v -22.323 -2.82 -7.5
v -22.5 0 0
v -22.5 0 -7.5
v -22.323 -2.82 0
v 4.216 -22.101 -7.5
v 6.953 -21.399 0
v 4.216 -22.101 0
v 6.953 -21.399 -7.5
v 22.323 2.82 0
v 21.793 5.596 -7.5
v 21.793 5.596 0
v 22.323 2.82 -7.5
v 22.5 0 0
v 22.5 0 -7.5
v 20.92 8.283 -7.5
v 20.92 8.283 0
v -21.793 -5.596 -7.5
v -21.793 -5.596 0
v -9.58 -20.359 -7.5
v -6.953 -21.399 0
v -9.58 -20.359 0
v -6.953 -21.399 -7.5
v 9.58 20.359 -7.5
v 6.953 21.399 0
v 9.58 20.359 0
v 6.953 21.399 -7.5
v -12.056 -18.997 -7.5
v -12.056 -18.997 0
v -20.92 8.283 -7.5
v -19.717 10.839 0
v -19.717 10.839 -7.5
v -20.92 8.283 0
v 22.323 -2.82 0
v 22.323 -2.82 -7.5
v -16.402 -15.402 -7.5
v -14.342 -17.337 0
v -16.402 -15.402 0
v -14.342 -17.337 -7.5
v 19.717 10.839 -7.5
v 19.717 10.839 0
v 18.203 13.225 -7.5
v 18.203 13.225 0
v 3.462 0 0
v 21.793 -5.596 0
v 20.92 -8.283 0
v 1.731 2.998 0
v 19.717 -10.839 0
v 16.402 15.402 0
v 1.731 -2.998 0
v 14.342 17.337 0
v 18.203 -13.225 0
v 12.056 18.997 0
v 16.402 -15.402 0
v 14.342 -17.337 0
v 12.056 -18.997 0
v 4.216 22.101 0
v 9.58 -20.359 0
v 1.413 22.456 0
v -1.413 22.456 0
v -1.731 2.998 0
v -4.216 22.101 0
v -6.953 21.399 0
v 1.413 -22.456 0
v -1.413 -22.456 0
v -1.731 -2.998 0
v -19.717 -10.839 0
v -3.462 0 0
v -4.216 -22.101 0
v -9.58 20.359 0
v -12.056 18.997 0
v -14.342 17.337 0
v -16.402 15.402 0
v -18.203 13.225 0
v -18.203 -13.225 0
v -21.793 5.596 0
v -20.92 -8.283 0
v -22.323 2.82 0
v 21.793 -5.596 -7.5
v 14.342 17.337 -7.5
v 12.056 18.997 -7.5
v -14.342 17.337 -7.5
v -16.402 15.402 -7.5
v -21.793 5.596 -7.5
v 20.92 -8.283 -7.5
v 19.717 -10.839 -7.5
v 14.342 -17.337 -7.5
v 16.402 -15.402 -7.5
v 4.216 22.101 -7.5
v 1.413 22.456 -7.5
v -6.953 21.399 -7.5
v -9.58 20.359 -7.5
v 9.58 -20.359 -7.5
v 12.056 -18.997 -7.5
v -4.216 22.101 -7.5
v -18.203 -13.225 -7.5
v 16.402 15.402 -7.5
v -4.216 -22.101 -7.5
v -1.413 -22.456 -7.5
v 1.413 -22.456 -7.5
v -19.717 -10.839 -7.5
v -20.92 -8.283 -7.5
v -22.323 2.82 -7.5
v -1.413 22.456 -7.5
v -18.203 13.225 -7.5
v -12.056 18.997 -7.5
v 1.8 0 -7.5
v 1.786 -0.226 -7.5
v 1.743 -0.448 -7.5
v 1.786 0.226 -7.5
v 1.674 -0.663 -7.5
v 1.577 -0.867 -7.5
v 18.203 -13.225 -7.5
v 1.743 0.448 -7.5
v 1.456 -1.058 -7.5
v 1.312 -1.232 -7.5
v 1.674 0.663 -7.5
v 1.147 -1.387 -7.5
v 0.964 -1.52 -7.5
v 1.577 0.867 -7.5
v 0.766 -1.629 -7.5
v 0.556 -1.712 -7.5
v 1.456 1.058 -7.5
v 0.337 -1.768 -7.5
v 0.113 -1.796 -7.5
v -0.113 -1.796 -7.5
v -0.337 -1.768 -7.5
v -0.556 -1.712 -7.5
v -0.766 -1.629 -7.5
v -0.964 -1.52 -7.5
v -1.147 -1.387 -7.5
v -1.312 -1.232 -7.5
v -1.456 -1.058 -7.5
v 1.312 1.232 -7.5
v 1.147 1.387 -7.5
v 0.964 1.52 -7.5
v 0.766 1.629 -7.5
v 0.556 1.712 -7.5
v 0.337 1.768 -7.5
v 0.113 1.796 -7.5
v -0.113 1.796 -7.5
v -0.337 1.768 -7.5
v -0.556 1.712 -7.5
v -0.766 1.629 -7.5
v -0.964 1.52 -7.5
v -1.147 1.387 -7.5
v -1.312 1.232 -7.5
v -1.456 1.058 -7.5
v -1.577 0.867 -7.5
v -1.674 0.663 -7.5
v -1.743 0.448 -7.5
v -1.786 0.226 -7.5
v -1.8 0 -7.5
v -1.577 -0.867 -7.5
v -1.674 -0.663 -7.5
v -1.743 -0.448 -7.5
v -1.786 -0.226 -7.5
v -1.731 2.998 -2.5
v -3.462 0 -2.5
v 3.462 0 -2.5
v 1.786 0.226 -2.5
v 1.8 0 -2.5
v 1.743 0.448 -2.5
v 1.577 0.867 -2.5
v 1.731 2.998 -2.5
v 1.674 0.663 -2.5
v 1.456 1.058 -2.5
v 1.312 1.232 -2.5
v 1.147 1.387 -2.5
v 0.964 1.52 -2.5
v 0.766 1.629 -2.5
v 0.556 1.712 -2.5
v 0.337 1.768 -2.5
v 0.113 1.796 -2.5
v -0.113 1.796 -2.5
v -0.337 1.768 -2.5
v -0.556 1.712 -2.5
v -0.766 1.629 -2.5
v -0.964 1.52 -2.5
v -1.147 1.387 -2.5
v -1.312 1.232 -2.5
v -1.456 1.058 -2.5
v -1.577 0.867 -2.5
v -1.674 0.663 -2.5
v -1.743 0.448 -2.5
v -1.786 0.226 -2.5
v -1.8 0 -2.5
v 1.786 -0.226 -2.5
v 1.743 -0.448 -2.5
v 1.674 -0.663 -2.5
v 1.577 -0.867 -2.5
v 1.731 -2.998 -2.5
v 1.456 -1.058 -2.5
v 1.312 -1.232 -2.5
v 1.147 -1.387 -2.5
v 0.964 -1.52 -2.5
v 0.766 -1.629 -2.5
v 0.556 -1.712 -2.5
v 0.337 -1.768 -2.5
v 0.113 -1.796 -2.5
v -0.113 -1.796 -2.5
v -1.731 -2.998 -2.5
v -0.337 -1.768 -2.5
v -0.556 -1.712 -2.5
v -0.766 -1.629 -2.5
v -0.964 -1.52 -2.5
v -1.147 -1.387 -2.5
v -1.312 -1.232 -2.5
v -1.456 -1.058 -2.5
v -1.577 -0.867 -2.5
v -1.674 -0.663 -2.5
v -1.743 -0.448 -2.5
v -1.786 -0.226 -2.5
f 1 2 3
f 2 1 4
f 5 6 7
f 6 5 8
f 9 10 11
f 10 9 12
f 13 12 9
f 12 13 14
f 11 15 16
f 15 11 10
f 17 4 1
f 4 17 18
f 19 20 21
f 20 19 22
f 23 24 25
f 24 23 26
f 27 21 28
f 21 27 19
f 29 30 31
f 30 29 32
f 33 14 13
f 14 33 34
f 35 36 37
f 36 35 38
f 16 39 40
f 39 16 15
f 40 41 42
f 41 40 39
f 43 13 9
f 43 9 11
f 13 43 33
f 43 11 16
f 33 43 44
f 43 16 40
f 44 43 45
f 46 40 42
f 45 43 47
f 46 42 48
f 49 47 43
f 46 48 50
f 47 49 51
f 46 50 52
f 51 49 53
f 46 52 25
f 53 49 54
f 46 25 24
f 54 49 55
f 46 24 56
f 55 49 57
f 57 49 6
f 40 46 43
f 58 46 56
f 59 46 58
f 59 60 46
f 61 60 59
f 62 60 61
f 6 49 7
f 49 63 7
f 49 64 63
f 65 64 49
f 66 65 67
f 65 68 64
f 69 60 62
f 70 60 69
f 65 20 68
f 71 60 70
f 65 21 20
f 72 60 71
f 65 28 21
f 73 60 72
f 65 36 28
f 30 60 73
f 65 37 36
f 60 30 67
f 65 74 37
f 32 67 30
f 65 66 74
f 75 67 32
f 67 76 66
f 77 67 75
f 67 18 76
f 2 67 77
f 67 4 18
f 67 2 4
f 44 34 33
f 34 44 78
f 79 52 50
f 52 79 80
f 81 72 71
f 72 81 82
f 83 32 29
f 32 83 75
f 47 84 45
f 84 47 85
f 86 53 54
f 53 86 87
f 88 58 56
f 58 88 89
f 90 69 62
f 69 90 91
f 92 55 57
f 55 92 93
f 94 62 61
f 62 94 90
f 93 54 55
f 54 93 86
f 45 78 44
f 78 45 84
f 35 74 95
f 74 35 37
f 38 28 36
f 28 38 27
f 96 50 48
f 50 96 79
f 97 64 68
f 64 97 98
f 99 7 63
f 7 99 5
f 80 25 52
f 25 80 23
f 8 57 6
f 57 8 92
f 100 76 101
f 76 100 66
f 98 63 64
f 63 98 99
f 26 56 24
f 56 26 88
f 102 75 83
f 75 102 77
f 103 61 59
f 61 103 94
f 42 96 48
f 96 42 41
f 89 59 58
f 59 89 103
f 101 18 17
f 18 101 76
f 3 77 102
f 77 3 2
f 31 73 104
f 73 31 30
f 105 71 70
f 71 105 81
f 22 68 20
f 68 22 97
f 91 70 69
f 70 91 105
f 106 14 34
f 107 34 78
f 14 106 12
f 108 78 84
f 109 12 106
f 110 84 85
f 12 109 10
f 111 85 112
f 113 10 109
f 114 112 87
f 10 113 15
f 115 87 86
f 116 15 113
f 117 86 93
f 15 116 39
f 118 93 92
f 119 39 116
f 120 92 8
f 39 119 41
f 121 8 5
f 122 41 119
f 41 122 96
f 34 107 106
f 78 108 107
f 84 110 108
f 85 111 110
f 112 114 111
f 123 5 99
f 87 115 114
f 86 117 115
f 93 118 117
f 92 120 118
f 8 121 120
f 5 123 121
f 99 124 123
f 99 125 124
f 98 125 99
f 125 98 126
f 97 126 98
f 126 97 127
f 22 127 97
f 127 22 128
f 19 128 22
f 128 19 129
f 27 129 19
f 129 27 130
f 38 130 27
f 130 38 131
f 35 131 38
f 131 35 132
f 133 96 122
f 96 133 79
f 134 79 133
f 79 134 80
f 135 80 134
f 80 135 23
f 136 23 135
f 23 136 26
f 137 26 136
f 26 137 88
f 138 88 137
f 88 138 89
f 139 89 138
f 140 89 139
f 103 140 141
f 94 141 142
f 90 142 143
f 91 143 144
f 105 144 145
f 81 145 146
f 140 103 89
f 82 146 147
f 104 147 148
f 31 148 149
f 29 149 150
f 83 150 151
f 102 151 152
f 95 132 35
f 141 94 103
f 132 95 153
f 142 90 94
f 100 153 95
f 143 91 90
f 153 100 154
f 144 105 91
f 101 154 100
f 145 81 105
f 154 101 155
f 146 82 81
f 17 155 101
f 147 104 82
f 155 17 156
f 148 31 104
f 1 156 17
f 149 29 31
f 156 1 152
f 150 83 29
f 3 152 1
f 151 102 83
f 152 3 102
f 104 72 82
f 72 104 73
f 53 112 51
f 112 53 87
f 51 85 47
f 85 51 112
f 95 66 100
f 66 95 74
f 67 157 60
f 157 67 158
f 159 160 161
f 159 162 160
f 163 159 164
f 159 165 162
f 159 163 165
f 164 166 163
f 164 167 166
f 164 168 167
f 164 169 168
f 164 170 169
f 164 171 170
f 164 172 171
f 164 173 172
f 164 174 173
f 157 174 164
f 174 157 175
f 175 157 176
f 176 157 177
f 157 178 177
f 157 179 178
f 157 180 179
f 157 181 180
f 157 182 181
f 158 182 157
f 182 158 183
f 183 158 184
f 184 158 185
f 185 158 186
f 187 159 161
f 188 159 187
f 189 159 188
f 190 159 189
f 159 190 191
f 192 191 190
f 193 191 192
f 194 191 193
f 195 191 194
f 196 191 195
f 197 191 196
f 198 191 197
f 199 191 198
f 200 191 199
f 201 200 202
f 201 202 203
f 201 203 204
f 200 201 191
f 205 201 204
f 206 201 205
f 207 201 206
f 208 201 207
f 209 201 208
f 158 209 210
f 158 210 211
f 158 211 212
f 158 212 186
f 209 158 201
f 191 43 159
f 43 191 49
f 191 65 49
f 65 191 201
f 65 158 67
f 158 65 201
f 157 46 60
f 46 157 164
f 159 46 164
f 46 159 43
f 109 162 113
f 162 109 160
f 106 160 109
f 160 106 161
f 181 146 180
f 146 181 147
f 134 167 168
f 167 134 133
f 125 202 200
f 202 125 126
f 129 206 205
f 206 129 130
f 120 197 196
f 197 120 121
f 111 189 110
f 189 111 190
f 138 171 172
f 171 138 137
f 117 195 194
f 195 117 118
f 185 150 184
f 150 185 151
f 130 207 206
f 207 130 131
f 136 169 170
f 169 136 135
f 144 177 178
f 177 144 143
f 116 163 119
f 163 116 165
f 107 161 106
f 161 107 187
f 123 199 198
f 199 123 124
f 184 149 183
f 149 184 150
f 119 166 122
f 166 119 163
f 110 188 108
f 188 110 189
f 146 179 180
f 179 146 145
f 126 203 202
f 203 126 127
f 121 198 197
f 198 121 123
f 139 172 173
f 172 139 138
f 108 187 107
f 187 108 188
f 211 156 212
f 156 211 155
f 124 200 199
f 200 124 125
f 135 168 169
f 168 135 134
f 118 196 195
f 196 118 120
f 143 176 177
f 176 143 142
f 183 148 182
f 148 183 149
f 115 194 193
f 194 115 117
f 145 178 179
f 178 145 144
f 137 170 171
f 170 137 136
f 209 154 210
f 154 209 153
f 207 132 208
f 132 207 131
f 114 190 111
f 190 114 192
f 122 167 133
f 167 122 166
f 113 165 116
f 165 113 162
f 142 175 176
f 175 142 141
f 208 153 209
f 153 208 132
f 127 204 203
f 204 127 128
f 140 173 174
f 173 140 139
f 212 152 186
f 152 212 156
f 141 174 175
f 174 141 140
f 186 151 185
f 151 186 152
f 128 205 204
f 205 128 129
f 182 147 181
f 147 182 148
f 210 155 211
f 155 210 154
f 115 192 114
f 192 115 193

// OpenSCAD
$fn = 50;


difference() {
	union() {
		translate(v = [0, 0, -7.5000000000]) {
			cylinder(h = 7.5000000000, r = 22.5000000000);
		}
		translate(v = [0, 0, -6.0000000000]) {
			cylinder(h = 6, r = 2.8750000000);
		}
	}
	union() {
		translate(v = [0, 0, 0]) {
			rotate(a = [0, 0, 0]) {
				difference() {
					union() {
						translate(v = [0, 0, -2.5000000000]) {
							linear_extrude(height = 2.5000000000) {
								polygon(points = [[3.4620000000, 0.0000000000], [1.7310000000, 2.9981799479], [-1.7310000000, 2.9981799479], [-3.4620000000, 0.0000000000], [-1.7310000000, -2.9981799479], [1.7310000000, -2.9981799479]]);
							}
						}
					}
					union();
				}
			}
		}
		#translate(v = [0, 0, -100.0000000000]) {
			cylinder(h = 200, r = 1.8000000000);
		}
	}
}
